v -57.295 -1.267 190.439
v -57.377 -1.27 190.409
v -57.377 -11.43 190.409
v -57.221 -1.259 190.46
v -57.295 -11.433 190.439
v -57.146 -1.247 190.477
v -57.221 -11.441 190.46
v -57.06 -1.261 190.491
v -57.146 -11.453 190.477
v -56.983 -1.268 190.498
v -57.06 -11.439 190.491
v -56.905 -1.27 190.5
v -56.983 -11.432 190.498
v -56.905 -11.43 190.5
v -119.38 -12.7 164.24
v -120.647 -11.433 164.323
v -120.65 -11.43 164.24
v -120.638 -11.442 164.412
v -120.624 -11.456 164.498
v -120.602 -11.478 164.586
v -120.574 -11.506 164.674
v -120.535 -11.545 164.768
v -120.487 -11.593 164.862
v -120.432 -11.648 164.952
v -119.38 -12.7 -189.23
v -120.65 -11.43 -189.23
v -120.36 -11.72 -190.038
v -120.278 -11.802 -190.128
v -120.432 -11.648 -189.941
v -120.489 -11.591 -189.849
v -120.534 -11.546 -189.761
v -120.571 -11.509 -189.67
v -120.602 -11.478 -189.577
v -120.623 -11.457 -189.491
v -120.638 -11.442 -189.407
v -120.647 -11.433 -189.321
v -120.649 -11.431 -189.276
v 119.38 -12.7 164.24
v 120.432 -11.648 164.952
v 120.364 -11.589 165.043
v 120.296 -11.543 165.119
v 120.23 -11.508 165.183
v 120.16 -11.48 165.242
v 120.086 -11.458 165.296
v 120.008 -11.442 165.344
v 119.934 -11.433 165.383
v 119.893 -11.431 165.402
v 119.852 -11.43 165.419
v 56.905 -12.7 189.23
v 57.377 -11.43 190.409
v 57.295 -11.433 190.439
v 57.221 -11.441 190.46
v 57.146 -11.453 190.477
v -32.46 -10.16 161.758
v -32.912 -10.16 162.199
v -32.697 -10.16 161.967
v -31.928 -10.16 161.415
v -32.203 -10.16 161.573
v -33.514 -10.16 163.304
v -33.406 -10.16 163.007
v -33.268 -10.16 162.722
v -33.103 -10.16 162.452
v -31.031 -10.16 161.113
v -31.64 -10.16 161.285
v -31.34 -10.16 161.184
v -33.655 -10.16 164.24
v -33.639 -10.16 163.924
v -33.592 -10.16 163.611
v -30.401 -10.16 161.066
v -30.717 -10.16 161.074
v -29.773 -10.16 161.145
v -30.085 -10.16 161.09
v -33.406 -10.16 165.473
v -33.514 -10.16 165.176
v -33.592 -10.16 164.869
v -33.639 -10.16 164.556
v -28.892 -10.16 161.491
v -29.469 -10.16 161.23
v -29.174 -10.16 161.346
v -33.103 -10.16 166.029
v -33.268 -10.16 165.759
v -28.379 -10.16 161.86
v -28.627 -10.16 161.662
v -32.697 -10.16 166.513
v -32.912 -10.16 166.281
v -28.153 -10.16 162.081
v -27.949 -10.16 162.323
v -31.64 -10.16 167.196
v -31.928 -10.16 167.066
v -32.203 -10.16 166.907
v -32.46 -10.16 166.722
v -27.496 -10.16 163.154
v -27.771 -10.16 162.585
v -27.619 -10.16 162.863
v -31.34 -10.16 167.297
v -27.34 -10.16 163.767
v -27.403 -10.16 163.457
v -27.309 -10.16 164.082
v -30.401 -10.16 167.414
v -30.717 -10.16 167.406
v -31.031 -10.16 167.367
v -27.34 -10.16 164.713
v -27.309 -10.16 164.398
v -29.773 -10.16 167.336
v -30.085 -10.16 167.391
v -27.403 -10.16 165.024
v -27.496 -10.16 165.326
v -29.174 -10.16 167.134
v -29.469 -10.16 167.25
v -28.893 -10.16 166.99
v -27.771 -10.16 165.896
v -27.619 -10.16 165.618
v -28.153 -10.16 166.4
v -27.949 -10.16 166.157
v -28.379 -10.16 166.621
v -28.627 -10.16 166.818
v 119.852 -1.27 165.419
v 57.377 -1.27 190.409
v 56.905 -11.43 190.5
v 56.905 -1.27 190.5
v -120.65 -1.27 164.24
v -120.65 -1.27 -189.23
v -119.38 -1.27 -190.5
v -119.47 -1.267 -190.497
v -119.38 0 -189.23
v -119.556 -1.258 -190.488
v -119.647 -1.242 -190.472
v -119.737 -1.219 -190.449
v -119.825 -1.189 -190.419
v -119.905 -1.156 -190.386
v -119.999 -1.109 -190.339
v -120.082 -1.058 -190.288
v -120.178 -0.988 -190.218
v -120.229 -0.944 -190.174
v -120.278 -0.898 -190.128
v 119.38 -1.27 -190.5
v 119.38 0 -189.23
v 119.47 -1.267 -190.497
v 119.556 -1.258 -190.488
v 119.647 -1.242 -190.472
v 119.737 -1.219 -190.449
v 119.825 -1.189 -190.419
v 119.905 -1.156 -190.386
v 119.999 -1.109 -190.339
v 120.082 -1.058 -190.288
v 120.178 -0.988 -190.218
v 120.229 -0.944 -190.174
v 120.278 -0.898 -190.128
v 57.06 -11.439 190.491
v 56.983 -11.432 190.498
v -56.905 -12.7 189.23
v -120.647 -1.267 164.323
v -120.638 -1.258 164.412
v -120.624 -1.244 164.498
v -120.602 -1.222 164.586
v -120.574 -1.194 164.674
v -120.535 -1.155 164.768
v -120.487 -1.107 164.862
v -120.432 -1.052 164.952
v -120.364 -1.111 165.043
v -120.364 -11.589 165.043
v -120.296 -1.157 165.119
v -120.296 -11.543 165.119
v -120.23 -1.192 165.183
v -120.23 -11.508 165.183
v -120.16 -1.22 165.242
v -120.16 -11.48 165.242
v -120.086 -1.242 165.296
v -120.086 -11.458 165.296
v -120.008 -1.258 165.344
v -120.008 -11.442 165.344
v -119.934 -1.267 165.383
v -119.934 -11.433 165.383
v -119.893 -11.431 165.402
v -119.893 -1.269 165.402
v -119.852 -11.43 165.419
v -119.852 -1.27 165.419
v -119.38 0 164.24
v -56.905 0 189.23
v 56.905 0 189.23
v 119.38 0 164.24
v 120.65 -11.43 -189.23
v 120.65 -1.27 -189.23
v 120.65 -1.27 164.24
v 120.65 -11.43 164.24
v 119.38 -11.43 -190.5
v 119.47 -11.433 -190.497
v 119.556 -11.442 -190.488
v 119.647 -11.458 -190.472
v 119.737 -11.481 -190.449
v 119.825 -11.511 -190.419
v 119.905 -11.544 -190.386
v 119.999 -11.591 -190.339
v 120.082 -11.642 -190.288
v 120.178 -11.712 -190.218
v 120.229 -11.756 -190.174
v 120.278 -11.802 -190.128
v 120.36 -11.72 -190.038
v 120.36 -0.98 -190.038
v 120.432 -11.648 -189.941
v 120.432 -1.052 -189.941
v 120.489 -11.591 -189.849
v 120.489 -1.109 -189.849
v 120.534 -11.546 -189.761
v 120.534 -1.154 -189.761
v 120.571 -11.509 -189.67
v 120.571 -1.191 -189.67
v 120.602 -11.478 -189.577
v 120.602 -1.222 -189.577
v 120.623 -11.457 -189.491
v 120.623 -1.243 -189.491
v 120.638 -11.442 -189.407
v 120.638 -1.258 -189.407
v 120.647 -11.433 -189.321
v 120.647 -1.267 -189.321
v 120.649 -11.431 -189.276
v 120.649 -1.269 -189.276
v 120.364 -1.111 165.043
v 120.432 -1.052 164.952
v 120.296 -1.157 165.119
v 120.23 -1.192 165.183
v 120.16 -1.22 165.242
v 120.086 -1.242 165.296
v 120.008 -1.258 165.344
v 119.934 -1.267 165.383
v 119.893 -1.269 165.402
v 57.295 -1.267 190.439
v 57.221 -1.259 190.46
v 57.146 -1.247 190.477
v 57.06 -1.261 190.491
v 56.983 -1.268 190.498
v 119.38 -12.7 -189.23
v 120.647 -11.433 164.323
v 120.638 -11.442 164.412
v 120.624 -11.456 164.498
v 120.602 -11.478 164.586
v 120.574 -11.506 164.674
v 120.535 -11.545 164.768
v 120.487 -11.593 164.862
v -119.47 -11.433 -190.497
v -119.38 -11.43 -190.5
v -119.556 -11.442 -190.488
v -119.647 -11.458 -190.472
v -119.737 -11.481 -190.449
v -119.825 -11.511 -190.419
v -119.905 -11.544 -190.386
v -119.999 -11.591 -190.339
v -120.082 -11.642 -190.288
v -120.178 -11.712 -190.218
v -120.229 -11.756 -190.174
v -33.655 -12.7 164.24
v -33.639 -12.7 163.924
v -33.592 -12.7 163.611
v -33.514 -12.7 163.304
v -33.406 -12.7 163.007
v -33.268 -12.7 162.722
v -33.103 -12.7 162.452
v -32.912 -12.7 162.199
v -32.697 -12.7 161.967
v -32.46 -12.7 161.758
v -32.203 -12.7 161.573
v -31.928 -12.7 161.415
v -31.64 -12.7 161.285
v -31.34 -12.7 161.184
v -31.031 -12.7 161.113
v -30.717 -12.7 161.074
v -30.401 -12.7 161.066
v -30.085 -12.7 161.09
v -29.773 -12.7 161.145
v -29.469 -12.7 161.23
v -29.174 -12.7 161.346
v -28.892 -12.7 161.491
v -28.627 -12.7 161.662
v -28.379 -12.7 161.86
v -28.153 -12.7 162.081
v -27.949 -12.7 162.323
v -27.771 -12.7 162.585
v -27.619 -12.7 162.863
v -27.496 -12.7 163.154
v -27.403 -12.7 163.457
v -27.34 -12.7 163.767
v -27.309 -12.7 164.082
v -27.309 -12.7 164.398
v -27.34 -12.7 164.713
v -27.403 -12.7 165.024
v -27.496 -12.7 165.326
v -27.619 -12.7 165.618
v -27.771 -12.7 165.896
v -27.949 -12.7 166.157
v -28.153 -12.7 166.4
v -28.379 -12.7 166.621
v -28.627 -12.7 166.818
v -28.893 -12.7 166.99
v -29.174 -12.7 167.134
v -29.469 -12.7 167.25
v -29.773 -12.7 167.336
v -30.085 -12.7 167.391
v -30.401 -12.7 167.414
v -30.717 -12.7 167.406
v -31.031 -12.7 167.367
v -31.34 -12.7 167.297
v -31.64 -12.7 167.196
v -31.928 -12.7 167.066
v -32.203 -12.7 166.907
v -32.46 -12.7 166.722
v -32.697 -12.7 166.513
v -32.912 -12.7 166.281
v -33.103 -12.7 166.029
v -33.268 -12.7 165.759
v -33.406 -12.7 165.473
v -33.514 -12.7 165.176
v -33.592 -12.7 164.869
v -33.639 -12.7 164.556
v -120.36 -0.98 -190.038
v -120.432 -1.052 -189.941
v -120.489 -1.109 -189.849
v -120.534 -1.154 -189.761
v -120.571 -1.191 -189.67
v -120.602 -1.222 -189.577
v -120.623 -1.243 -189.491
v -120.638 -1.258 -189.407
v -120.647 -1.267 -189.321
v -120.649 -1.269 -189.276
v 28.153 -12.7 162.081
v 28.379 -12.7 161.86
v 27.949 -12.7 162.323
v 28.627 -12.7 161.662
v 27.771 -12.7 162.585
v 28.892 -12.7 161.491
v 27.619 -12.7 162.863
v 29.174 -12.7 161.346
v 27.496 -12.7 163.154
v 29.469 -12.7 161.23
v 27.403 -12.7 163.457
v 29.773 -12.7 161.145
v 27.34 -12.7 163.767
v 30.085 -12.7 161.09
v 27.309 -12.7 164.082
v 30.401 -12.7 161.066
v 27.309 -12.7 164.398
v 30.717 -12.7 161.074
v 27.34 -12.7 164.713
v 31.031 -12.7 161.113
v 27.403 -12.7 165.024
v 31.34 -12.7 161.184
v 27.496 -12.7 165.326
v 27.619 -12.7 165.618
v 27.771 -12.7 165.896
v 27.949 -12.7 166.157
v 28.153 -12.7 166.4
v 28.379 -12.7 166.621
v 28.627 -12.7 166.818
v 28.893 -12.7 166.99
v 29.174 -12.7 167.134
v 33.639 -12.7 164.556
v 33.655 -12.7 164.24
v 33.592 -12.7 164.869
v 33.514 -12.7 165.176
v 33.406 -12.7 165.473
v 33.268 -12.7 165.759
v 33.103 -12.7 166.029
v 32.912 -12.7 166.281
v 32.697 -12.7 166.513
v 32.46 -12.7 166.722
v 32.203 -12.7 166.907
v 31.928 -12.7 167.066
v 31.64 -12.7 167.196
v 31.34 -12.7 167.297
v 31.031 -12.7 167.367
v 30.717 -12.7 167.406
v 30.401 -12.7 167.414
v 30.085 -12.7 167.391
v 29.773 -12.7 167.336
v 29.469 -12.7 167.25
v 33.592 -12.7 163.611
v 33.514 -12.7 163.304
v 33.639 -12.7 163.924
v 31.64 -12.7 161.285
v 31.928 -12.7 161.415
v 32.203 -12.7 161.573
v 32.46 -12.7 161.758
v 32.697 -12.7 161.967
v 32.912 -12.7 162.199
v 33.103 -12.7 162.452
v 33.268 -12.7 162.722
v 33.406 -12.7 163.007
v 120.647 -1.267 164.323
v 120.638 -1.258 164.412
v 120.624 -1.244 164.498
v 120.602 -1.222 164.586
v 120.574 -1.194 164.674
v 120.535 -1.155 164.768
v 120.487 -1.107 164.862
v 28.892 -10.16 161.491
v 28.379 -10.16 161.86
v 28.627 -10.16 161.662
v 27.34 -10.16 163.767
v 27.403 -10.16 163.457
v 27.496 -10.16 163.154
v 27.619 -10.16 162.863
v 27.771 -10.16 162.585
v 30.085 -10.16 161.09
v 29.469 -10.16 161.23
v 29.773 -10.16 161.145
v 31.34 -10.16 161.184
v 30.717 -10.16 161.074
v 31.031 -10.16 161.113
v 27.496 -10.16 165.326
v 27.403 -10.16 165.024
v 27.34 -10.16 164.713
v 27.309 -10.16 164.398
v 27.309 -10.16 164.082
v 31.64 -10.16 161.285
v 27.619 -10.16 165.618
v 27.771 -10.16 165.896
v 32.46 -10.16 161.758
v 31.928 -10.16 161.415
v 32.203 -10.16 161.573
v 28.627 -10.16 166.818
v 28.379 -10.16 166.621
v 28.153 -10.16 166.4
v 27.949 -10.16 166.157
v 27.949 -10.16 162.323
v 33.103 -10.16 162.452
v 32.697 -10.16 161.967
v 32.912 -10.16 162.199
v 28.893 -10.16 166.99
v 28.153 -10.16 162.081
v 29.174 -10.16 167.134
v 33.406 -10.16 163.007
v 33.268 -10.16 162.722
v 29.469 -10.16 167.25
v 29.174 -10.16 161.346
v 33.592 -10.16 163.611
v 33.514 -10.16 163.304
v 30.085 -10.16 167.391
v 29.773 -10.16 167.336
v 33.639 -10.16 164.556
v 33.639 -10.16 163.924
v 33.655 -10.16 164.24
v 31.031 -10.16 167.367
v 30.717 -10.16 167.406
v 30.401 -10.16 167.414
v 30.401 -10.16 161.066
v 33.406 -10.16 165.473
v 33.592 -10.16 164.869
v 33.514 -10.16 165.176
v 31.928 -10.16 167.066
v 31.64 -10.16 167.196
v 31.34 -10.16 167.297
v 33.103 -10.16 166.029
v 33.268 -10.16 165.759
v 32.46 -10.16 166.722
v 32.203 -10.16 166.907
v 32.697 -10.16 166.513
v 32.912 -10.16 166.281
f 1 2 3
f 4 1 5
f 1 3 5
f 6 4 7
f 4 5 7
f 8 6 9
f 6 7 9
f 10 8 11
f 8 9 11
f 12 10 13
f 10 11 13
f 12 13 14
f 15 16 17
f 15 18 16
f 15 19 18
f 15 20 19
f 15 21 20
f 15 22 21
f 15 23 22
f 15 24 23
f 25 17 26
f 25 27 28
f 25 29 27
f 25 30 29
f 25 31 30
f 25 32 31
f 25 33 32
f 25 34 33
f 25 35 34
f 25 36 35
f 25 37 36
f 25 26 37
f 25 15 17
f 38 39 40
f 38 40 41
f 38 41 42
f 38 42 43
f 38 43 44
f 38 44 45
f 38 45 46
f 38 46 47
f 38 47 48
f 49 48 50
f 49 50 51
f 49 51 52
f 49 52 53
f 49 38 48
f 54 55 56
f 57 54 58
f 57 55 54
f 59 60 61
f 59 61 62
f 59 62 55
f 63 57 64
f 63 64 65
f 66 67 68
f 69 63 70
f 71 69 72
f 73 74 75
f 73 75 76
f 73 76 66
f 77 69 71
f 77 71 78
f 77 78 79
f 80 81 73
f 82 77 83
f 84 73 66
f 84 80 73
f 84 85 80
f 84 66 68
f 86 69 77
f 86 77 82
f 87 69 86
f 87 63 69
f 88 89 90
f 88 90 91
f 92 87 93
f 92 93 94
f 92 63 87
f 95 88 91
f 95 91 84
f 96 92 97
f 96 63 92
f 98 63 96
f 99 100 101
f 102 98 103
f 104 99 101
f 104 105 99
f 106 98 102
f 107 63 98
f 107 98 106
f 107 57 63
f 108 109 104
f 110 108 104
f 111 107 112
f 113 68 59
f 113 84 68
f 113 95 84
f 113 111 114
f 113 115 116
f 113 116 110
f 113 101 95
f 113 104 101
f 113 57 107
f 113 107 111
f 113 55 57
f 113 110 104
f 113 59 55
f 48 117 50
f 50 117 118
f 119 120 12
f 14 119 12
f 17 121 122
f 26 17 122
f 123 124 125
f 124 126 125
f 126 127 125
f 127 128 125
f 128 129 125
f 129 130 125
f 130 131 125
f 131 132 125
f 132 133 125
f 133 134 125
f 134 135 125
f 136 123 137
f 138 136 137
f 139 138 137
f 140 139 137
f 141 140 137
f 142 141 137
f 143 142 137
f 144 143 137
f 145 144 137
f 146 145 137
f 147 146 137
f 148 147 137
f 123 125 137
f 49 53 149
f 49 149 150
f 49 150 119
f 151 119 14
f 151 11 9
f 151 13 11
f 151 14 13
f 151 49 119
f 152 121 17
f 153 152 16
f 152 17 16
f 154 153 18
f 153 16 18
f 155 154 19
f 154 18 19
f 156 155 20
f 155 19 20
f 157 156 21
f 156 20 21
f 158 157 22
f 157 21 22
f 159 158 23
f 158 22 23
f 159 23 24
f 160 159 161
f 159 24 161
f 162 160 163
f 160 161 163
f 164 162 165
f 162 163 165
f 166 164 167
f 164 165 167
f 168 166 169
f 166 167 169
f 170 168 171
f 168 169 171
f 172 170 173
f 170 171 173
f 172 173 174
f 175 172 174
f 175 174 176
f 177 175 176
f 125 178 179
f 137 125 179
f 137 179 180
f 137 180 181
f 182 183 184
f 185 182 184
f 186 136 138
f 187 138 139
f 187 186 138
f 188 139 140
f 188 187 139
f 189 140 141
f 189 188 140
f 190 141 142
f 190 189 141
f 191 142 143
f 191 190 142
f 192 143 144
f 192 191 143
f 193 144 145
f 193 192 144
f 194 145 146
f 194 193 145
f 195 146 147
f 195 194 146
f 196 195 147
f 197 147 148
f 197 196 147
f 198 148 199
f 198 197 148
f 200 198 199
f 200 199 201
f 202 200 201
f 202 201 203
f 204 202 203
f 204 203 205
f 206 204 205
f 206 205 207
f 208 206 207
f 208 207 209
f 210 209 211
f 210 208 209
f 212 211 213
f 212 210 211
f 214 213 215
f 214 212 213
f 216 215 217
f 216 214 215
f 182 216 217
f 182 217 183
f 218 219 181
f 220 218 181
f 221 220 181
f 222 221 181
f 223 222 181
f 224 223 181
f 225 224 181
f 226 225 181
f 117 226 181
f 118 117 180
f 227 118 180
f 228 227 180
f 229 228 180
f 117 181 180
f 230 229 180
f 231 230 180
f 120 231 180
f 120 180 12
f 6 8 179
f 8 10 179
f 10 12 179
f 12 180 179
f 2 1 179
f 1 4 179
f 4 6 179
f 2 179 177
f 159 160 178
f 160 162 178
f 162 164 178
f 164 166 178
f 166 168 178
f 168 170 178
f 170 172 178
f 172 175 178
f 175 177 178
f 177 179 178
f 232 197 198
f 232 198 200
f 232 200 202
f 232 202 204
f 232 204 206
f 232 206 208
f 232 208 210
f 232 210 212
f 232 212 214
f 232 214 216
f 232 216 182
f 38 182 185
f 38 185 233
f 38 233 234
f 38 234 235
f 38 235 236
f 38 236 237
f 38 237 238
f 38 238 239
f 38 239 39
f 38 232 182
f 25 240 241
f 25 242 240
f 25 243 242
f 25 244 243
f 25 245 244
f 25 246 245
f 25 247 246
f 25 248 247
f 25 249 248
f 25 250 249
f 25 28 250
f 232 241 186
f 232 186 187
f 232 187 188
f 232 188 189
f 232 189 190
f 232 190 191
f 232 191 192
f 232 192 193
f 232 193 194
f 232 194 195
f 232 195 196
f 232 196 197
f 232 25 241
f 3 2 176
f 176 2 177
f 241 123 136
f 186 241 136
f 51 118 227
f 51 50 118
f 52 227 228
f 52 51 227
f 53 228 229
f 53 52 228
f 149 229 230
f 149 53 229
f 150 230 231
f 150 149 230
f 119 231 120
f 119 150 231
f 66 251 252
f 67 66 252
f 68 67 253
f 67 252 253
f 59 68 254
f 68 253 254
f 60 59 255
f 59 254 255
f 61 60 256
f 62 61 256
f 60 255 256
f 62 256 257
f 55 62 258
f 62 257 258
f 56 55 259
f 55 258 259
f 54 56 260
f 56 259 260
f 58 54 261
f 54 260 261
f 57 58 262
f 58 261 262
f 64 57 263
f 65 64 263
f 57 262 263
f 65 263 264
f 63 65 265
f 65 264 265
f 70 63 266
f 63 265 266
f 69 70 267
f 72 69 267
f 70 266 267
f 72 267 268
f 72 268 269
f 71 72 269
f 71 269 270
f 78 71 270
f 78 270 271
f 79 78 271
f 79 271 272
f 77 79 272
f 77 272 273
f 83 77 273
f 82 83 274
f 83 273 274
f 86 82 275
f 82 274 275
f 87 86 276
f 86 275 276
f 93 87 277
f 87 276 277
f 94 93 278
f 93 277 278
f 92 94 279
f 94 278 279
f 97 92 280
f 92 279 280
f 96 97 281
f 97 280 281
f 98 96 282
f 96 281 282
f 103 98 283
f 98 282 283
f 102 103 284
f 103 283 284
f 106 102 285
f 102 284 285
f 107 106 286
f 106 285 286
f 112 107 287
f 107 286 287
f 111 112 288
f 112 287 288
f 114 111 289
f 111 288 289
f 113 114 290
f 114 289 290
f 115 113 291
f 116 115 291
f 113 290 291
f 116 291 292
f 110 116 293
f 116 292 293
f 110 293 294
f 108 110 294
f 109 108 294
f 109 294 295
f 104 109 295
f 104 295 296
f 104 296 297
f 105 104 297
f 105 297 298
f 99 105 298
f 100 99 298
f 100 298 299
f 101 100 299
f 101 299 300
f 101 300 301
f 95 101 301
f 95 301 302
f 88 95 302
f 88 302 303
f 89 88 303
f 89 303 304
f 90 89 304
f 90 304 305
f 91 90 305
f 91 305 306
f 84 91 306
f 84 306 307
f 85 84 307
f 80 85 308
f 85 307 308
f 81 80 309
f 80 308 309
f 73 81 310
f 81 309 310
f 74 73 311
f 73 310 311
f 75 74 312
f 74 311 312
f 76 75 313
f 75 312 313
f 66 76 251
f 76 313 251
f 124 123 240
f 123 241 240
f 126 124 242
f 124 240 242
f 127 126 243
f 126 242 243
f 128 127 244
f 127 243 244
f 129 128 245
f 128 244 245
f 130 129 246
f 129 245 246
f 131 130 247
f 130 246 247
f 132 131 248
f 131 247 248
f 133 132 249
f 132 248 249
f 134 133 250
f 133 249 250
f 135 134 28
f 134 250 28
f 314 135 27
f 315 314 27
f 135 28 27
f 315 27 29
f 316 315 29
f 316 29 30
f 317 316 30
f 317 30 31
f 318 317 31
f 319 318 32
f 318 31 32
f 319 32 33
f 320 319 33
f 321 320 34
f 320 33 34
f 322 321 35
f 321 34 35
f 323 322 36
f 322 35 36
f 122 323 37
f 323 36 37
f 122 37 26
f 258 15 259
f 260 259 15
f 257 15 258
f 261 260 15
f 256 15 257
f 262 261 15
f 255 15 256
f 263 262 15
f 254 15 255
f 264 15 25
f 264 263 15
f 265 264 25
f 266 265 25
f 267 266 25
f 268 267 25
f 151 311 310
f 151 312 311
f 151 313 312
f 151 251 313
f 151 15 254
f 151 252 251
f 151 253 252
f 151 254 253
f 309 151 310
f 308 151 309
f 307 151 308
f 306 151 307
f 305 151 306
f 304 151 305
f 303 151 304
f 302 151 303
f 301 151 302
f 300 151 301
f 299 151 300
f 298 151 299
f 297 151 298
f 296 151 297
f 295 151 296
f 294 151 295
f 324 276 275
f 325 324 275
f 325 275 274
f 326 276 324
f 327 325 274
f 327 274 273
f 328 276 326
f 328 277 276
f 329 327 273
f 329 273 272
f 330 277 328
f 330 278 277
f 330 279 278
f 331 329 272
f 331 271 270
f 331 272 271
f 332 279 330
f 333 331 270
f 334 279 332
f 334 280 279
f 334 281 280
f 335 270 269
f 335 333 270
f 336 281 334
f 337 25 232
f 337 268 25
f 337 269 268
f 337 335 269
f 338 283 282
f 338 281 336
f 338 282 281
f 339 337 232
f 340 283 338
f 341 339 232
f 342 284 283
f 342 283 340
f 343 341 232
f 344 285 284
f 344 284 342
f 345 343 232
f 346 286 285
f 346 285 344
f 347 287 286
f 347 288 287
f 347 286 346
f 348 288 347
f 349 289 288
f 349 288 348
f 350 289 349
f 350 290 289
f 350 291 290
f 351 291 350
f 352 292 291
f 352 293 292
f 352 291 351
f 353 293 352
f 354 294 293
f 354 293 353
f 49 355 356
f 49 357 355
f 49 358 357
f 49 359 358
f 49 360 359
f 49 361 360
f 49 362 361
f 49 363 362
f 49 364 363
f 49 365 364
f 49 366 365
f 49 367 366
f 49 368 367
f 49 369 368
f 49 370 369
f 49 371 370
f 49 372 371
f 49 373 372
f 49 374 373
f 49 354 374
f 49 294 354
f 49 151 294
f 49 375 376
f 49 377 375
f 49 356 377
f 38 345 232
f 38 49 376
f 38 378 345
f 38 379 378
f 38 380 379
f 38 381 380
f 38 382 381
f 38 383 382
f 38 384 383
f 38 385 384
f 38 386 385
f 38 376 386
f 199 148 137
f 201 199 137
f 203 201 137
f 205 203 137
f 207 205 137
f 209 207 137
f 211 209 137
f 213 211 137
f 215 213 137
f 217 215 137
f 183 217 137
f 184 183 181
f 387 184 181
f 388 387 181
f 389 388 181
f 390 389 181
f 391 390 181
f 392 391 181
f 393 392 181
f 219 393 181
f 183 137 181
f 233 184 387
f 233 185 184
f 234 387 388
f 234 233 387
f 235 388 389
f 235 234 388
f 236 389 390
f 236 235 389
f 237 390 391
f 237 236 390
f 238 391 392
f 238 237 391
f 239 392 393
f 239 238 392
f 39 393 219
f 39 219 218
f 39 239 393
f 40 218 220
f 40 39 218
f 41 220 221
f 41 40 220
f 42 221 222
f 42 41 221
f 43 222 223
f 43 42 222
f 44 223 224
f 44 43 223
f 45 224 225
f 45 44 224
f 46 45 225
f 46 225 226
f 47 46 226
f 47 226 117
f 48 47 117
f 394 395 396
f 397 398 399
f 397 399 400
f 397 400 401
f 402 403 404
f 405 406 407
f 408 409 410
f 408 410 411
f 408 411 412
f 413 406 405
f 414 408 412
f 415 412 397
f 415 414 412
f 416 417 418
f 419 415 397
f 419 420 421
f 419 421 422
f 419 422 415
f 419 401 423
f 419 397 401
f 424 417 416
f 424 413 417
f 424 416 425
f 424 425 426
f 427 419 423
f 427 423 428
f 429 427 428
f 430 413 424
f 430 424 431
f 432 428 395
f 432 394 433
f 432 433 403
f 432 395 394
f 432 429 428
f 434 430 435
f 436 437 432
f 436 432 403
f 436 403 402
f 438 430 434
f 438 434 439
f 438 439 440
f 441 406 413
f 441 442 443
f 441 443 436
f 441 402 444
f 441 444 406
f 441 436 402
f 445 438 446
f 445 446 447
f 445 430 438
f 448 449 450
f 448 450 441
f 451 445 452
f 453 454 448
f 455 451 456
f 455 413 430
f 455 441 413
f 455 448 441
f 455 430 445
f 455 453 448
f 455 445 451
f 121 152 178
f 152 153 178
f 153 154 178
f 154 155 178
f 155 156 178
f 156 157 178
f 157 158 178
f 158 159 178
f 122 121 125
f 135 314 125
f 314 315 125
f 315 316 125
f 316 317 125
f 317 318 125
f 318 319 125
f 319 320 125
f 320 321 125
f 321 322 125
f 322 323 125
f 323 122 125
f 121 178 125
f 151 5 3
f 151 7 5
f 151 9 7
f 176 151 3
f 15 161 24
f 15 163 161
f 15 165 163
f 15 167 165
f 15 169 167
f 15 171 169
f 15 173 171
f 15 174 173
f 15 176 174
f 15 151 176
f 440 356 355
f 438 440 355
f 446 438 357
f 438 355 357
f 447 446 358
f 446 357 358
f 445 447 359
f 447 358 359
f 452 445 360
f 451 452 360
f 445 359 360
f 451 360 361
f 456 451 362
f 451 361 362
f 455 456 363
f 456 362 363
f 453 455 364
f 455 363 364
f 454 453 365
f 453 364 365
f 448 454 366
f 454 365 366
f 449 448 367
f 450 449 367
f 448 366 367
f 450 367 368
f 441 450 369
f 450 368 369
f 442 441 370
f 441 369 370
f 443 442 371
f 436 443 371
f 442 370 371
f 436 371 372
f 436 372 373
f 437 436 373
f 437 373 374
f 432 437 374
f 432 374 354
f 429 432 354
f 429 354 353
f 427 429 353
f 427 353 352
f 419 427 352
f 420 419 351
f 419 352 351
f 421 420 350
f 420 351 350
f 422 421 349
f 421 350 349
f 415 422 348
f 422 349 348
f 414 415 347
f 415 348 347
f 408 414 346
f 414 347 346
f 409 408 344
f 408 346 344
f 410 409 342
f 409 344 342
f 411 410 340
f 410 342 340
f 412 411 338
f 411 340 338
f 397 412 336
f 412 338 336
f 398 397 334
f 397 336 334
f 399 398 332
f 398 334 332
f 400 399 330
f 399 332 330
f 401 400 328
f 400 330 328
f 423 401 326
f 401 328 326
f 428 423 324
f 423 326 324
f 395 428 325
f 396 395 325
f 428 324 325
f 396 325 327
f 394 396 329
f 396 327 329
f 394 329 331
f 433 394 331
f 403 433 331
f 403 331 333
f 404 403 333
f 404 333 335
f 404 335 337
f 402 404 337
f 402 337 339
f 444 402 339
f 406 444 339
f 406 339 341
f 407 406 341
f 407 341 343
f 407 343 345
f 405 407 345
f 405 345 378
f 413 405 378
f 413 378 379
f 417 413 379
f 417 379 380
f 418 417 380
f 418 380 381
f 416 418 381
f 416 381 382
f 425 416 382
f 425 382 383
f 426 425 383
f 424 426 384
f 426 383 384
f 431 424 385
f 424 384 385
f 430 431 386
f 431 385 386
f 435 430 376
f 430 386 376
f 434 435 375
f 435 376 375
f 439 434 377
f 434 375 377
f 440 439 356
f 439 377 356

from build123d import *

# Parameters (mm, degrees)
F1_DEPTH = 12.7
F2_SIZE  = 1.27
F3_R     = 1.27
F5_DEPTH = 2.54


with BuildPart() as f1:
    # F0 (on Front) → F1 (new body)
    with BuildSketch(Plane.XZ):
        Polygon((-120.65, -190.5), (120.65, -190.5), (120.65, 165.1), (57.15, 190.5), (-57.15, 190.5), (-120.65, 165.1), align=None)
    extrude(amount=F1_DEPTH)

    # F2
    f2_edges = [f1.edges().sort_by_distance(p)[0] for p in [
        (-88.9, -12.7, 177.8),
        (0, -12.7, 190.5),
        (88.9, -12.7, 177.8),
        (120.65, -12.7, -12.7),
        (0, -12.7, -190.5),
        (-120.65, -12.7, -12.7),
        (120.65, 0, -12.7),
        (0, 0, -190.5),
        (-120.65, 0, -12.7),
        (-88.9, 0, 177.8),
        (0, 0, 190.5),
        (88.9, 0, 177.8),
    ]]
    chamfer(f2_edges, length=F2_SIZE)

    # F3
    f3_edges = [f1.edges().sort_by_distance(p)[0] for p in [
        (-120.65, -6.35, 165.1),
        (-57.15, -6.35, 190.5),
        (57.15, -6.35, 190.5),
        (120.65, -6.35, 165.1),
        (120.65, -6.35, -190.5),
        (-120.65, -6.35, -190.5),
    ]]
    fillet(f3_edges, radius=F3_R)

    # F4 (on face) → F5 (cut)
    with BuildSketch(Plane.XZ.offset(12.7)):
        with BuildLine():
            ThreePointArc((27.305, 164.240168139), (30.48, 161.065168139), (33.655, 164.240168139))
            Line((33.655, 164.240168139), (27.305, 164.240168139))
        make_face()
        with BuildLine():
            Line((27.305, 164.240168139), (33.655, 164.240168139))
            ThreePointArc((33.655, 164.240168139), (30.48, 167.415168139), (27.305, 164.240168139))
        make_face()
        with BuildLine():
            Line((-33.655, 164.240168139), (-27.305, 164.240168139))
            ThreePointArc((-27.305, 164.240168139), (-30.48, 167.415168139), (-33.655, 164.240168139))
        make_face()
        with BuildLine():
            ThreePointArc((-33.655, 164.240168139), (-30.48, 161.065168139), (-27.305, 164.240168139))
            Line((-27.305, 164.240168139), (-33.655, 164.240168139))
        make_face()
    extrude(amount=-F5_DEPTH, mode=Mode.SUBTRACT)


solid = f1.part
